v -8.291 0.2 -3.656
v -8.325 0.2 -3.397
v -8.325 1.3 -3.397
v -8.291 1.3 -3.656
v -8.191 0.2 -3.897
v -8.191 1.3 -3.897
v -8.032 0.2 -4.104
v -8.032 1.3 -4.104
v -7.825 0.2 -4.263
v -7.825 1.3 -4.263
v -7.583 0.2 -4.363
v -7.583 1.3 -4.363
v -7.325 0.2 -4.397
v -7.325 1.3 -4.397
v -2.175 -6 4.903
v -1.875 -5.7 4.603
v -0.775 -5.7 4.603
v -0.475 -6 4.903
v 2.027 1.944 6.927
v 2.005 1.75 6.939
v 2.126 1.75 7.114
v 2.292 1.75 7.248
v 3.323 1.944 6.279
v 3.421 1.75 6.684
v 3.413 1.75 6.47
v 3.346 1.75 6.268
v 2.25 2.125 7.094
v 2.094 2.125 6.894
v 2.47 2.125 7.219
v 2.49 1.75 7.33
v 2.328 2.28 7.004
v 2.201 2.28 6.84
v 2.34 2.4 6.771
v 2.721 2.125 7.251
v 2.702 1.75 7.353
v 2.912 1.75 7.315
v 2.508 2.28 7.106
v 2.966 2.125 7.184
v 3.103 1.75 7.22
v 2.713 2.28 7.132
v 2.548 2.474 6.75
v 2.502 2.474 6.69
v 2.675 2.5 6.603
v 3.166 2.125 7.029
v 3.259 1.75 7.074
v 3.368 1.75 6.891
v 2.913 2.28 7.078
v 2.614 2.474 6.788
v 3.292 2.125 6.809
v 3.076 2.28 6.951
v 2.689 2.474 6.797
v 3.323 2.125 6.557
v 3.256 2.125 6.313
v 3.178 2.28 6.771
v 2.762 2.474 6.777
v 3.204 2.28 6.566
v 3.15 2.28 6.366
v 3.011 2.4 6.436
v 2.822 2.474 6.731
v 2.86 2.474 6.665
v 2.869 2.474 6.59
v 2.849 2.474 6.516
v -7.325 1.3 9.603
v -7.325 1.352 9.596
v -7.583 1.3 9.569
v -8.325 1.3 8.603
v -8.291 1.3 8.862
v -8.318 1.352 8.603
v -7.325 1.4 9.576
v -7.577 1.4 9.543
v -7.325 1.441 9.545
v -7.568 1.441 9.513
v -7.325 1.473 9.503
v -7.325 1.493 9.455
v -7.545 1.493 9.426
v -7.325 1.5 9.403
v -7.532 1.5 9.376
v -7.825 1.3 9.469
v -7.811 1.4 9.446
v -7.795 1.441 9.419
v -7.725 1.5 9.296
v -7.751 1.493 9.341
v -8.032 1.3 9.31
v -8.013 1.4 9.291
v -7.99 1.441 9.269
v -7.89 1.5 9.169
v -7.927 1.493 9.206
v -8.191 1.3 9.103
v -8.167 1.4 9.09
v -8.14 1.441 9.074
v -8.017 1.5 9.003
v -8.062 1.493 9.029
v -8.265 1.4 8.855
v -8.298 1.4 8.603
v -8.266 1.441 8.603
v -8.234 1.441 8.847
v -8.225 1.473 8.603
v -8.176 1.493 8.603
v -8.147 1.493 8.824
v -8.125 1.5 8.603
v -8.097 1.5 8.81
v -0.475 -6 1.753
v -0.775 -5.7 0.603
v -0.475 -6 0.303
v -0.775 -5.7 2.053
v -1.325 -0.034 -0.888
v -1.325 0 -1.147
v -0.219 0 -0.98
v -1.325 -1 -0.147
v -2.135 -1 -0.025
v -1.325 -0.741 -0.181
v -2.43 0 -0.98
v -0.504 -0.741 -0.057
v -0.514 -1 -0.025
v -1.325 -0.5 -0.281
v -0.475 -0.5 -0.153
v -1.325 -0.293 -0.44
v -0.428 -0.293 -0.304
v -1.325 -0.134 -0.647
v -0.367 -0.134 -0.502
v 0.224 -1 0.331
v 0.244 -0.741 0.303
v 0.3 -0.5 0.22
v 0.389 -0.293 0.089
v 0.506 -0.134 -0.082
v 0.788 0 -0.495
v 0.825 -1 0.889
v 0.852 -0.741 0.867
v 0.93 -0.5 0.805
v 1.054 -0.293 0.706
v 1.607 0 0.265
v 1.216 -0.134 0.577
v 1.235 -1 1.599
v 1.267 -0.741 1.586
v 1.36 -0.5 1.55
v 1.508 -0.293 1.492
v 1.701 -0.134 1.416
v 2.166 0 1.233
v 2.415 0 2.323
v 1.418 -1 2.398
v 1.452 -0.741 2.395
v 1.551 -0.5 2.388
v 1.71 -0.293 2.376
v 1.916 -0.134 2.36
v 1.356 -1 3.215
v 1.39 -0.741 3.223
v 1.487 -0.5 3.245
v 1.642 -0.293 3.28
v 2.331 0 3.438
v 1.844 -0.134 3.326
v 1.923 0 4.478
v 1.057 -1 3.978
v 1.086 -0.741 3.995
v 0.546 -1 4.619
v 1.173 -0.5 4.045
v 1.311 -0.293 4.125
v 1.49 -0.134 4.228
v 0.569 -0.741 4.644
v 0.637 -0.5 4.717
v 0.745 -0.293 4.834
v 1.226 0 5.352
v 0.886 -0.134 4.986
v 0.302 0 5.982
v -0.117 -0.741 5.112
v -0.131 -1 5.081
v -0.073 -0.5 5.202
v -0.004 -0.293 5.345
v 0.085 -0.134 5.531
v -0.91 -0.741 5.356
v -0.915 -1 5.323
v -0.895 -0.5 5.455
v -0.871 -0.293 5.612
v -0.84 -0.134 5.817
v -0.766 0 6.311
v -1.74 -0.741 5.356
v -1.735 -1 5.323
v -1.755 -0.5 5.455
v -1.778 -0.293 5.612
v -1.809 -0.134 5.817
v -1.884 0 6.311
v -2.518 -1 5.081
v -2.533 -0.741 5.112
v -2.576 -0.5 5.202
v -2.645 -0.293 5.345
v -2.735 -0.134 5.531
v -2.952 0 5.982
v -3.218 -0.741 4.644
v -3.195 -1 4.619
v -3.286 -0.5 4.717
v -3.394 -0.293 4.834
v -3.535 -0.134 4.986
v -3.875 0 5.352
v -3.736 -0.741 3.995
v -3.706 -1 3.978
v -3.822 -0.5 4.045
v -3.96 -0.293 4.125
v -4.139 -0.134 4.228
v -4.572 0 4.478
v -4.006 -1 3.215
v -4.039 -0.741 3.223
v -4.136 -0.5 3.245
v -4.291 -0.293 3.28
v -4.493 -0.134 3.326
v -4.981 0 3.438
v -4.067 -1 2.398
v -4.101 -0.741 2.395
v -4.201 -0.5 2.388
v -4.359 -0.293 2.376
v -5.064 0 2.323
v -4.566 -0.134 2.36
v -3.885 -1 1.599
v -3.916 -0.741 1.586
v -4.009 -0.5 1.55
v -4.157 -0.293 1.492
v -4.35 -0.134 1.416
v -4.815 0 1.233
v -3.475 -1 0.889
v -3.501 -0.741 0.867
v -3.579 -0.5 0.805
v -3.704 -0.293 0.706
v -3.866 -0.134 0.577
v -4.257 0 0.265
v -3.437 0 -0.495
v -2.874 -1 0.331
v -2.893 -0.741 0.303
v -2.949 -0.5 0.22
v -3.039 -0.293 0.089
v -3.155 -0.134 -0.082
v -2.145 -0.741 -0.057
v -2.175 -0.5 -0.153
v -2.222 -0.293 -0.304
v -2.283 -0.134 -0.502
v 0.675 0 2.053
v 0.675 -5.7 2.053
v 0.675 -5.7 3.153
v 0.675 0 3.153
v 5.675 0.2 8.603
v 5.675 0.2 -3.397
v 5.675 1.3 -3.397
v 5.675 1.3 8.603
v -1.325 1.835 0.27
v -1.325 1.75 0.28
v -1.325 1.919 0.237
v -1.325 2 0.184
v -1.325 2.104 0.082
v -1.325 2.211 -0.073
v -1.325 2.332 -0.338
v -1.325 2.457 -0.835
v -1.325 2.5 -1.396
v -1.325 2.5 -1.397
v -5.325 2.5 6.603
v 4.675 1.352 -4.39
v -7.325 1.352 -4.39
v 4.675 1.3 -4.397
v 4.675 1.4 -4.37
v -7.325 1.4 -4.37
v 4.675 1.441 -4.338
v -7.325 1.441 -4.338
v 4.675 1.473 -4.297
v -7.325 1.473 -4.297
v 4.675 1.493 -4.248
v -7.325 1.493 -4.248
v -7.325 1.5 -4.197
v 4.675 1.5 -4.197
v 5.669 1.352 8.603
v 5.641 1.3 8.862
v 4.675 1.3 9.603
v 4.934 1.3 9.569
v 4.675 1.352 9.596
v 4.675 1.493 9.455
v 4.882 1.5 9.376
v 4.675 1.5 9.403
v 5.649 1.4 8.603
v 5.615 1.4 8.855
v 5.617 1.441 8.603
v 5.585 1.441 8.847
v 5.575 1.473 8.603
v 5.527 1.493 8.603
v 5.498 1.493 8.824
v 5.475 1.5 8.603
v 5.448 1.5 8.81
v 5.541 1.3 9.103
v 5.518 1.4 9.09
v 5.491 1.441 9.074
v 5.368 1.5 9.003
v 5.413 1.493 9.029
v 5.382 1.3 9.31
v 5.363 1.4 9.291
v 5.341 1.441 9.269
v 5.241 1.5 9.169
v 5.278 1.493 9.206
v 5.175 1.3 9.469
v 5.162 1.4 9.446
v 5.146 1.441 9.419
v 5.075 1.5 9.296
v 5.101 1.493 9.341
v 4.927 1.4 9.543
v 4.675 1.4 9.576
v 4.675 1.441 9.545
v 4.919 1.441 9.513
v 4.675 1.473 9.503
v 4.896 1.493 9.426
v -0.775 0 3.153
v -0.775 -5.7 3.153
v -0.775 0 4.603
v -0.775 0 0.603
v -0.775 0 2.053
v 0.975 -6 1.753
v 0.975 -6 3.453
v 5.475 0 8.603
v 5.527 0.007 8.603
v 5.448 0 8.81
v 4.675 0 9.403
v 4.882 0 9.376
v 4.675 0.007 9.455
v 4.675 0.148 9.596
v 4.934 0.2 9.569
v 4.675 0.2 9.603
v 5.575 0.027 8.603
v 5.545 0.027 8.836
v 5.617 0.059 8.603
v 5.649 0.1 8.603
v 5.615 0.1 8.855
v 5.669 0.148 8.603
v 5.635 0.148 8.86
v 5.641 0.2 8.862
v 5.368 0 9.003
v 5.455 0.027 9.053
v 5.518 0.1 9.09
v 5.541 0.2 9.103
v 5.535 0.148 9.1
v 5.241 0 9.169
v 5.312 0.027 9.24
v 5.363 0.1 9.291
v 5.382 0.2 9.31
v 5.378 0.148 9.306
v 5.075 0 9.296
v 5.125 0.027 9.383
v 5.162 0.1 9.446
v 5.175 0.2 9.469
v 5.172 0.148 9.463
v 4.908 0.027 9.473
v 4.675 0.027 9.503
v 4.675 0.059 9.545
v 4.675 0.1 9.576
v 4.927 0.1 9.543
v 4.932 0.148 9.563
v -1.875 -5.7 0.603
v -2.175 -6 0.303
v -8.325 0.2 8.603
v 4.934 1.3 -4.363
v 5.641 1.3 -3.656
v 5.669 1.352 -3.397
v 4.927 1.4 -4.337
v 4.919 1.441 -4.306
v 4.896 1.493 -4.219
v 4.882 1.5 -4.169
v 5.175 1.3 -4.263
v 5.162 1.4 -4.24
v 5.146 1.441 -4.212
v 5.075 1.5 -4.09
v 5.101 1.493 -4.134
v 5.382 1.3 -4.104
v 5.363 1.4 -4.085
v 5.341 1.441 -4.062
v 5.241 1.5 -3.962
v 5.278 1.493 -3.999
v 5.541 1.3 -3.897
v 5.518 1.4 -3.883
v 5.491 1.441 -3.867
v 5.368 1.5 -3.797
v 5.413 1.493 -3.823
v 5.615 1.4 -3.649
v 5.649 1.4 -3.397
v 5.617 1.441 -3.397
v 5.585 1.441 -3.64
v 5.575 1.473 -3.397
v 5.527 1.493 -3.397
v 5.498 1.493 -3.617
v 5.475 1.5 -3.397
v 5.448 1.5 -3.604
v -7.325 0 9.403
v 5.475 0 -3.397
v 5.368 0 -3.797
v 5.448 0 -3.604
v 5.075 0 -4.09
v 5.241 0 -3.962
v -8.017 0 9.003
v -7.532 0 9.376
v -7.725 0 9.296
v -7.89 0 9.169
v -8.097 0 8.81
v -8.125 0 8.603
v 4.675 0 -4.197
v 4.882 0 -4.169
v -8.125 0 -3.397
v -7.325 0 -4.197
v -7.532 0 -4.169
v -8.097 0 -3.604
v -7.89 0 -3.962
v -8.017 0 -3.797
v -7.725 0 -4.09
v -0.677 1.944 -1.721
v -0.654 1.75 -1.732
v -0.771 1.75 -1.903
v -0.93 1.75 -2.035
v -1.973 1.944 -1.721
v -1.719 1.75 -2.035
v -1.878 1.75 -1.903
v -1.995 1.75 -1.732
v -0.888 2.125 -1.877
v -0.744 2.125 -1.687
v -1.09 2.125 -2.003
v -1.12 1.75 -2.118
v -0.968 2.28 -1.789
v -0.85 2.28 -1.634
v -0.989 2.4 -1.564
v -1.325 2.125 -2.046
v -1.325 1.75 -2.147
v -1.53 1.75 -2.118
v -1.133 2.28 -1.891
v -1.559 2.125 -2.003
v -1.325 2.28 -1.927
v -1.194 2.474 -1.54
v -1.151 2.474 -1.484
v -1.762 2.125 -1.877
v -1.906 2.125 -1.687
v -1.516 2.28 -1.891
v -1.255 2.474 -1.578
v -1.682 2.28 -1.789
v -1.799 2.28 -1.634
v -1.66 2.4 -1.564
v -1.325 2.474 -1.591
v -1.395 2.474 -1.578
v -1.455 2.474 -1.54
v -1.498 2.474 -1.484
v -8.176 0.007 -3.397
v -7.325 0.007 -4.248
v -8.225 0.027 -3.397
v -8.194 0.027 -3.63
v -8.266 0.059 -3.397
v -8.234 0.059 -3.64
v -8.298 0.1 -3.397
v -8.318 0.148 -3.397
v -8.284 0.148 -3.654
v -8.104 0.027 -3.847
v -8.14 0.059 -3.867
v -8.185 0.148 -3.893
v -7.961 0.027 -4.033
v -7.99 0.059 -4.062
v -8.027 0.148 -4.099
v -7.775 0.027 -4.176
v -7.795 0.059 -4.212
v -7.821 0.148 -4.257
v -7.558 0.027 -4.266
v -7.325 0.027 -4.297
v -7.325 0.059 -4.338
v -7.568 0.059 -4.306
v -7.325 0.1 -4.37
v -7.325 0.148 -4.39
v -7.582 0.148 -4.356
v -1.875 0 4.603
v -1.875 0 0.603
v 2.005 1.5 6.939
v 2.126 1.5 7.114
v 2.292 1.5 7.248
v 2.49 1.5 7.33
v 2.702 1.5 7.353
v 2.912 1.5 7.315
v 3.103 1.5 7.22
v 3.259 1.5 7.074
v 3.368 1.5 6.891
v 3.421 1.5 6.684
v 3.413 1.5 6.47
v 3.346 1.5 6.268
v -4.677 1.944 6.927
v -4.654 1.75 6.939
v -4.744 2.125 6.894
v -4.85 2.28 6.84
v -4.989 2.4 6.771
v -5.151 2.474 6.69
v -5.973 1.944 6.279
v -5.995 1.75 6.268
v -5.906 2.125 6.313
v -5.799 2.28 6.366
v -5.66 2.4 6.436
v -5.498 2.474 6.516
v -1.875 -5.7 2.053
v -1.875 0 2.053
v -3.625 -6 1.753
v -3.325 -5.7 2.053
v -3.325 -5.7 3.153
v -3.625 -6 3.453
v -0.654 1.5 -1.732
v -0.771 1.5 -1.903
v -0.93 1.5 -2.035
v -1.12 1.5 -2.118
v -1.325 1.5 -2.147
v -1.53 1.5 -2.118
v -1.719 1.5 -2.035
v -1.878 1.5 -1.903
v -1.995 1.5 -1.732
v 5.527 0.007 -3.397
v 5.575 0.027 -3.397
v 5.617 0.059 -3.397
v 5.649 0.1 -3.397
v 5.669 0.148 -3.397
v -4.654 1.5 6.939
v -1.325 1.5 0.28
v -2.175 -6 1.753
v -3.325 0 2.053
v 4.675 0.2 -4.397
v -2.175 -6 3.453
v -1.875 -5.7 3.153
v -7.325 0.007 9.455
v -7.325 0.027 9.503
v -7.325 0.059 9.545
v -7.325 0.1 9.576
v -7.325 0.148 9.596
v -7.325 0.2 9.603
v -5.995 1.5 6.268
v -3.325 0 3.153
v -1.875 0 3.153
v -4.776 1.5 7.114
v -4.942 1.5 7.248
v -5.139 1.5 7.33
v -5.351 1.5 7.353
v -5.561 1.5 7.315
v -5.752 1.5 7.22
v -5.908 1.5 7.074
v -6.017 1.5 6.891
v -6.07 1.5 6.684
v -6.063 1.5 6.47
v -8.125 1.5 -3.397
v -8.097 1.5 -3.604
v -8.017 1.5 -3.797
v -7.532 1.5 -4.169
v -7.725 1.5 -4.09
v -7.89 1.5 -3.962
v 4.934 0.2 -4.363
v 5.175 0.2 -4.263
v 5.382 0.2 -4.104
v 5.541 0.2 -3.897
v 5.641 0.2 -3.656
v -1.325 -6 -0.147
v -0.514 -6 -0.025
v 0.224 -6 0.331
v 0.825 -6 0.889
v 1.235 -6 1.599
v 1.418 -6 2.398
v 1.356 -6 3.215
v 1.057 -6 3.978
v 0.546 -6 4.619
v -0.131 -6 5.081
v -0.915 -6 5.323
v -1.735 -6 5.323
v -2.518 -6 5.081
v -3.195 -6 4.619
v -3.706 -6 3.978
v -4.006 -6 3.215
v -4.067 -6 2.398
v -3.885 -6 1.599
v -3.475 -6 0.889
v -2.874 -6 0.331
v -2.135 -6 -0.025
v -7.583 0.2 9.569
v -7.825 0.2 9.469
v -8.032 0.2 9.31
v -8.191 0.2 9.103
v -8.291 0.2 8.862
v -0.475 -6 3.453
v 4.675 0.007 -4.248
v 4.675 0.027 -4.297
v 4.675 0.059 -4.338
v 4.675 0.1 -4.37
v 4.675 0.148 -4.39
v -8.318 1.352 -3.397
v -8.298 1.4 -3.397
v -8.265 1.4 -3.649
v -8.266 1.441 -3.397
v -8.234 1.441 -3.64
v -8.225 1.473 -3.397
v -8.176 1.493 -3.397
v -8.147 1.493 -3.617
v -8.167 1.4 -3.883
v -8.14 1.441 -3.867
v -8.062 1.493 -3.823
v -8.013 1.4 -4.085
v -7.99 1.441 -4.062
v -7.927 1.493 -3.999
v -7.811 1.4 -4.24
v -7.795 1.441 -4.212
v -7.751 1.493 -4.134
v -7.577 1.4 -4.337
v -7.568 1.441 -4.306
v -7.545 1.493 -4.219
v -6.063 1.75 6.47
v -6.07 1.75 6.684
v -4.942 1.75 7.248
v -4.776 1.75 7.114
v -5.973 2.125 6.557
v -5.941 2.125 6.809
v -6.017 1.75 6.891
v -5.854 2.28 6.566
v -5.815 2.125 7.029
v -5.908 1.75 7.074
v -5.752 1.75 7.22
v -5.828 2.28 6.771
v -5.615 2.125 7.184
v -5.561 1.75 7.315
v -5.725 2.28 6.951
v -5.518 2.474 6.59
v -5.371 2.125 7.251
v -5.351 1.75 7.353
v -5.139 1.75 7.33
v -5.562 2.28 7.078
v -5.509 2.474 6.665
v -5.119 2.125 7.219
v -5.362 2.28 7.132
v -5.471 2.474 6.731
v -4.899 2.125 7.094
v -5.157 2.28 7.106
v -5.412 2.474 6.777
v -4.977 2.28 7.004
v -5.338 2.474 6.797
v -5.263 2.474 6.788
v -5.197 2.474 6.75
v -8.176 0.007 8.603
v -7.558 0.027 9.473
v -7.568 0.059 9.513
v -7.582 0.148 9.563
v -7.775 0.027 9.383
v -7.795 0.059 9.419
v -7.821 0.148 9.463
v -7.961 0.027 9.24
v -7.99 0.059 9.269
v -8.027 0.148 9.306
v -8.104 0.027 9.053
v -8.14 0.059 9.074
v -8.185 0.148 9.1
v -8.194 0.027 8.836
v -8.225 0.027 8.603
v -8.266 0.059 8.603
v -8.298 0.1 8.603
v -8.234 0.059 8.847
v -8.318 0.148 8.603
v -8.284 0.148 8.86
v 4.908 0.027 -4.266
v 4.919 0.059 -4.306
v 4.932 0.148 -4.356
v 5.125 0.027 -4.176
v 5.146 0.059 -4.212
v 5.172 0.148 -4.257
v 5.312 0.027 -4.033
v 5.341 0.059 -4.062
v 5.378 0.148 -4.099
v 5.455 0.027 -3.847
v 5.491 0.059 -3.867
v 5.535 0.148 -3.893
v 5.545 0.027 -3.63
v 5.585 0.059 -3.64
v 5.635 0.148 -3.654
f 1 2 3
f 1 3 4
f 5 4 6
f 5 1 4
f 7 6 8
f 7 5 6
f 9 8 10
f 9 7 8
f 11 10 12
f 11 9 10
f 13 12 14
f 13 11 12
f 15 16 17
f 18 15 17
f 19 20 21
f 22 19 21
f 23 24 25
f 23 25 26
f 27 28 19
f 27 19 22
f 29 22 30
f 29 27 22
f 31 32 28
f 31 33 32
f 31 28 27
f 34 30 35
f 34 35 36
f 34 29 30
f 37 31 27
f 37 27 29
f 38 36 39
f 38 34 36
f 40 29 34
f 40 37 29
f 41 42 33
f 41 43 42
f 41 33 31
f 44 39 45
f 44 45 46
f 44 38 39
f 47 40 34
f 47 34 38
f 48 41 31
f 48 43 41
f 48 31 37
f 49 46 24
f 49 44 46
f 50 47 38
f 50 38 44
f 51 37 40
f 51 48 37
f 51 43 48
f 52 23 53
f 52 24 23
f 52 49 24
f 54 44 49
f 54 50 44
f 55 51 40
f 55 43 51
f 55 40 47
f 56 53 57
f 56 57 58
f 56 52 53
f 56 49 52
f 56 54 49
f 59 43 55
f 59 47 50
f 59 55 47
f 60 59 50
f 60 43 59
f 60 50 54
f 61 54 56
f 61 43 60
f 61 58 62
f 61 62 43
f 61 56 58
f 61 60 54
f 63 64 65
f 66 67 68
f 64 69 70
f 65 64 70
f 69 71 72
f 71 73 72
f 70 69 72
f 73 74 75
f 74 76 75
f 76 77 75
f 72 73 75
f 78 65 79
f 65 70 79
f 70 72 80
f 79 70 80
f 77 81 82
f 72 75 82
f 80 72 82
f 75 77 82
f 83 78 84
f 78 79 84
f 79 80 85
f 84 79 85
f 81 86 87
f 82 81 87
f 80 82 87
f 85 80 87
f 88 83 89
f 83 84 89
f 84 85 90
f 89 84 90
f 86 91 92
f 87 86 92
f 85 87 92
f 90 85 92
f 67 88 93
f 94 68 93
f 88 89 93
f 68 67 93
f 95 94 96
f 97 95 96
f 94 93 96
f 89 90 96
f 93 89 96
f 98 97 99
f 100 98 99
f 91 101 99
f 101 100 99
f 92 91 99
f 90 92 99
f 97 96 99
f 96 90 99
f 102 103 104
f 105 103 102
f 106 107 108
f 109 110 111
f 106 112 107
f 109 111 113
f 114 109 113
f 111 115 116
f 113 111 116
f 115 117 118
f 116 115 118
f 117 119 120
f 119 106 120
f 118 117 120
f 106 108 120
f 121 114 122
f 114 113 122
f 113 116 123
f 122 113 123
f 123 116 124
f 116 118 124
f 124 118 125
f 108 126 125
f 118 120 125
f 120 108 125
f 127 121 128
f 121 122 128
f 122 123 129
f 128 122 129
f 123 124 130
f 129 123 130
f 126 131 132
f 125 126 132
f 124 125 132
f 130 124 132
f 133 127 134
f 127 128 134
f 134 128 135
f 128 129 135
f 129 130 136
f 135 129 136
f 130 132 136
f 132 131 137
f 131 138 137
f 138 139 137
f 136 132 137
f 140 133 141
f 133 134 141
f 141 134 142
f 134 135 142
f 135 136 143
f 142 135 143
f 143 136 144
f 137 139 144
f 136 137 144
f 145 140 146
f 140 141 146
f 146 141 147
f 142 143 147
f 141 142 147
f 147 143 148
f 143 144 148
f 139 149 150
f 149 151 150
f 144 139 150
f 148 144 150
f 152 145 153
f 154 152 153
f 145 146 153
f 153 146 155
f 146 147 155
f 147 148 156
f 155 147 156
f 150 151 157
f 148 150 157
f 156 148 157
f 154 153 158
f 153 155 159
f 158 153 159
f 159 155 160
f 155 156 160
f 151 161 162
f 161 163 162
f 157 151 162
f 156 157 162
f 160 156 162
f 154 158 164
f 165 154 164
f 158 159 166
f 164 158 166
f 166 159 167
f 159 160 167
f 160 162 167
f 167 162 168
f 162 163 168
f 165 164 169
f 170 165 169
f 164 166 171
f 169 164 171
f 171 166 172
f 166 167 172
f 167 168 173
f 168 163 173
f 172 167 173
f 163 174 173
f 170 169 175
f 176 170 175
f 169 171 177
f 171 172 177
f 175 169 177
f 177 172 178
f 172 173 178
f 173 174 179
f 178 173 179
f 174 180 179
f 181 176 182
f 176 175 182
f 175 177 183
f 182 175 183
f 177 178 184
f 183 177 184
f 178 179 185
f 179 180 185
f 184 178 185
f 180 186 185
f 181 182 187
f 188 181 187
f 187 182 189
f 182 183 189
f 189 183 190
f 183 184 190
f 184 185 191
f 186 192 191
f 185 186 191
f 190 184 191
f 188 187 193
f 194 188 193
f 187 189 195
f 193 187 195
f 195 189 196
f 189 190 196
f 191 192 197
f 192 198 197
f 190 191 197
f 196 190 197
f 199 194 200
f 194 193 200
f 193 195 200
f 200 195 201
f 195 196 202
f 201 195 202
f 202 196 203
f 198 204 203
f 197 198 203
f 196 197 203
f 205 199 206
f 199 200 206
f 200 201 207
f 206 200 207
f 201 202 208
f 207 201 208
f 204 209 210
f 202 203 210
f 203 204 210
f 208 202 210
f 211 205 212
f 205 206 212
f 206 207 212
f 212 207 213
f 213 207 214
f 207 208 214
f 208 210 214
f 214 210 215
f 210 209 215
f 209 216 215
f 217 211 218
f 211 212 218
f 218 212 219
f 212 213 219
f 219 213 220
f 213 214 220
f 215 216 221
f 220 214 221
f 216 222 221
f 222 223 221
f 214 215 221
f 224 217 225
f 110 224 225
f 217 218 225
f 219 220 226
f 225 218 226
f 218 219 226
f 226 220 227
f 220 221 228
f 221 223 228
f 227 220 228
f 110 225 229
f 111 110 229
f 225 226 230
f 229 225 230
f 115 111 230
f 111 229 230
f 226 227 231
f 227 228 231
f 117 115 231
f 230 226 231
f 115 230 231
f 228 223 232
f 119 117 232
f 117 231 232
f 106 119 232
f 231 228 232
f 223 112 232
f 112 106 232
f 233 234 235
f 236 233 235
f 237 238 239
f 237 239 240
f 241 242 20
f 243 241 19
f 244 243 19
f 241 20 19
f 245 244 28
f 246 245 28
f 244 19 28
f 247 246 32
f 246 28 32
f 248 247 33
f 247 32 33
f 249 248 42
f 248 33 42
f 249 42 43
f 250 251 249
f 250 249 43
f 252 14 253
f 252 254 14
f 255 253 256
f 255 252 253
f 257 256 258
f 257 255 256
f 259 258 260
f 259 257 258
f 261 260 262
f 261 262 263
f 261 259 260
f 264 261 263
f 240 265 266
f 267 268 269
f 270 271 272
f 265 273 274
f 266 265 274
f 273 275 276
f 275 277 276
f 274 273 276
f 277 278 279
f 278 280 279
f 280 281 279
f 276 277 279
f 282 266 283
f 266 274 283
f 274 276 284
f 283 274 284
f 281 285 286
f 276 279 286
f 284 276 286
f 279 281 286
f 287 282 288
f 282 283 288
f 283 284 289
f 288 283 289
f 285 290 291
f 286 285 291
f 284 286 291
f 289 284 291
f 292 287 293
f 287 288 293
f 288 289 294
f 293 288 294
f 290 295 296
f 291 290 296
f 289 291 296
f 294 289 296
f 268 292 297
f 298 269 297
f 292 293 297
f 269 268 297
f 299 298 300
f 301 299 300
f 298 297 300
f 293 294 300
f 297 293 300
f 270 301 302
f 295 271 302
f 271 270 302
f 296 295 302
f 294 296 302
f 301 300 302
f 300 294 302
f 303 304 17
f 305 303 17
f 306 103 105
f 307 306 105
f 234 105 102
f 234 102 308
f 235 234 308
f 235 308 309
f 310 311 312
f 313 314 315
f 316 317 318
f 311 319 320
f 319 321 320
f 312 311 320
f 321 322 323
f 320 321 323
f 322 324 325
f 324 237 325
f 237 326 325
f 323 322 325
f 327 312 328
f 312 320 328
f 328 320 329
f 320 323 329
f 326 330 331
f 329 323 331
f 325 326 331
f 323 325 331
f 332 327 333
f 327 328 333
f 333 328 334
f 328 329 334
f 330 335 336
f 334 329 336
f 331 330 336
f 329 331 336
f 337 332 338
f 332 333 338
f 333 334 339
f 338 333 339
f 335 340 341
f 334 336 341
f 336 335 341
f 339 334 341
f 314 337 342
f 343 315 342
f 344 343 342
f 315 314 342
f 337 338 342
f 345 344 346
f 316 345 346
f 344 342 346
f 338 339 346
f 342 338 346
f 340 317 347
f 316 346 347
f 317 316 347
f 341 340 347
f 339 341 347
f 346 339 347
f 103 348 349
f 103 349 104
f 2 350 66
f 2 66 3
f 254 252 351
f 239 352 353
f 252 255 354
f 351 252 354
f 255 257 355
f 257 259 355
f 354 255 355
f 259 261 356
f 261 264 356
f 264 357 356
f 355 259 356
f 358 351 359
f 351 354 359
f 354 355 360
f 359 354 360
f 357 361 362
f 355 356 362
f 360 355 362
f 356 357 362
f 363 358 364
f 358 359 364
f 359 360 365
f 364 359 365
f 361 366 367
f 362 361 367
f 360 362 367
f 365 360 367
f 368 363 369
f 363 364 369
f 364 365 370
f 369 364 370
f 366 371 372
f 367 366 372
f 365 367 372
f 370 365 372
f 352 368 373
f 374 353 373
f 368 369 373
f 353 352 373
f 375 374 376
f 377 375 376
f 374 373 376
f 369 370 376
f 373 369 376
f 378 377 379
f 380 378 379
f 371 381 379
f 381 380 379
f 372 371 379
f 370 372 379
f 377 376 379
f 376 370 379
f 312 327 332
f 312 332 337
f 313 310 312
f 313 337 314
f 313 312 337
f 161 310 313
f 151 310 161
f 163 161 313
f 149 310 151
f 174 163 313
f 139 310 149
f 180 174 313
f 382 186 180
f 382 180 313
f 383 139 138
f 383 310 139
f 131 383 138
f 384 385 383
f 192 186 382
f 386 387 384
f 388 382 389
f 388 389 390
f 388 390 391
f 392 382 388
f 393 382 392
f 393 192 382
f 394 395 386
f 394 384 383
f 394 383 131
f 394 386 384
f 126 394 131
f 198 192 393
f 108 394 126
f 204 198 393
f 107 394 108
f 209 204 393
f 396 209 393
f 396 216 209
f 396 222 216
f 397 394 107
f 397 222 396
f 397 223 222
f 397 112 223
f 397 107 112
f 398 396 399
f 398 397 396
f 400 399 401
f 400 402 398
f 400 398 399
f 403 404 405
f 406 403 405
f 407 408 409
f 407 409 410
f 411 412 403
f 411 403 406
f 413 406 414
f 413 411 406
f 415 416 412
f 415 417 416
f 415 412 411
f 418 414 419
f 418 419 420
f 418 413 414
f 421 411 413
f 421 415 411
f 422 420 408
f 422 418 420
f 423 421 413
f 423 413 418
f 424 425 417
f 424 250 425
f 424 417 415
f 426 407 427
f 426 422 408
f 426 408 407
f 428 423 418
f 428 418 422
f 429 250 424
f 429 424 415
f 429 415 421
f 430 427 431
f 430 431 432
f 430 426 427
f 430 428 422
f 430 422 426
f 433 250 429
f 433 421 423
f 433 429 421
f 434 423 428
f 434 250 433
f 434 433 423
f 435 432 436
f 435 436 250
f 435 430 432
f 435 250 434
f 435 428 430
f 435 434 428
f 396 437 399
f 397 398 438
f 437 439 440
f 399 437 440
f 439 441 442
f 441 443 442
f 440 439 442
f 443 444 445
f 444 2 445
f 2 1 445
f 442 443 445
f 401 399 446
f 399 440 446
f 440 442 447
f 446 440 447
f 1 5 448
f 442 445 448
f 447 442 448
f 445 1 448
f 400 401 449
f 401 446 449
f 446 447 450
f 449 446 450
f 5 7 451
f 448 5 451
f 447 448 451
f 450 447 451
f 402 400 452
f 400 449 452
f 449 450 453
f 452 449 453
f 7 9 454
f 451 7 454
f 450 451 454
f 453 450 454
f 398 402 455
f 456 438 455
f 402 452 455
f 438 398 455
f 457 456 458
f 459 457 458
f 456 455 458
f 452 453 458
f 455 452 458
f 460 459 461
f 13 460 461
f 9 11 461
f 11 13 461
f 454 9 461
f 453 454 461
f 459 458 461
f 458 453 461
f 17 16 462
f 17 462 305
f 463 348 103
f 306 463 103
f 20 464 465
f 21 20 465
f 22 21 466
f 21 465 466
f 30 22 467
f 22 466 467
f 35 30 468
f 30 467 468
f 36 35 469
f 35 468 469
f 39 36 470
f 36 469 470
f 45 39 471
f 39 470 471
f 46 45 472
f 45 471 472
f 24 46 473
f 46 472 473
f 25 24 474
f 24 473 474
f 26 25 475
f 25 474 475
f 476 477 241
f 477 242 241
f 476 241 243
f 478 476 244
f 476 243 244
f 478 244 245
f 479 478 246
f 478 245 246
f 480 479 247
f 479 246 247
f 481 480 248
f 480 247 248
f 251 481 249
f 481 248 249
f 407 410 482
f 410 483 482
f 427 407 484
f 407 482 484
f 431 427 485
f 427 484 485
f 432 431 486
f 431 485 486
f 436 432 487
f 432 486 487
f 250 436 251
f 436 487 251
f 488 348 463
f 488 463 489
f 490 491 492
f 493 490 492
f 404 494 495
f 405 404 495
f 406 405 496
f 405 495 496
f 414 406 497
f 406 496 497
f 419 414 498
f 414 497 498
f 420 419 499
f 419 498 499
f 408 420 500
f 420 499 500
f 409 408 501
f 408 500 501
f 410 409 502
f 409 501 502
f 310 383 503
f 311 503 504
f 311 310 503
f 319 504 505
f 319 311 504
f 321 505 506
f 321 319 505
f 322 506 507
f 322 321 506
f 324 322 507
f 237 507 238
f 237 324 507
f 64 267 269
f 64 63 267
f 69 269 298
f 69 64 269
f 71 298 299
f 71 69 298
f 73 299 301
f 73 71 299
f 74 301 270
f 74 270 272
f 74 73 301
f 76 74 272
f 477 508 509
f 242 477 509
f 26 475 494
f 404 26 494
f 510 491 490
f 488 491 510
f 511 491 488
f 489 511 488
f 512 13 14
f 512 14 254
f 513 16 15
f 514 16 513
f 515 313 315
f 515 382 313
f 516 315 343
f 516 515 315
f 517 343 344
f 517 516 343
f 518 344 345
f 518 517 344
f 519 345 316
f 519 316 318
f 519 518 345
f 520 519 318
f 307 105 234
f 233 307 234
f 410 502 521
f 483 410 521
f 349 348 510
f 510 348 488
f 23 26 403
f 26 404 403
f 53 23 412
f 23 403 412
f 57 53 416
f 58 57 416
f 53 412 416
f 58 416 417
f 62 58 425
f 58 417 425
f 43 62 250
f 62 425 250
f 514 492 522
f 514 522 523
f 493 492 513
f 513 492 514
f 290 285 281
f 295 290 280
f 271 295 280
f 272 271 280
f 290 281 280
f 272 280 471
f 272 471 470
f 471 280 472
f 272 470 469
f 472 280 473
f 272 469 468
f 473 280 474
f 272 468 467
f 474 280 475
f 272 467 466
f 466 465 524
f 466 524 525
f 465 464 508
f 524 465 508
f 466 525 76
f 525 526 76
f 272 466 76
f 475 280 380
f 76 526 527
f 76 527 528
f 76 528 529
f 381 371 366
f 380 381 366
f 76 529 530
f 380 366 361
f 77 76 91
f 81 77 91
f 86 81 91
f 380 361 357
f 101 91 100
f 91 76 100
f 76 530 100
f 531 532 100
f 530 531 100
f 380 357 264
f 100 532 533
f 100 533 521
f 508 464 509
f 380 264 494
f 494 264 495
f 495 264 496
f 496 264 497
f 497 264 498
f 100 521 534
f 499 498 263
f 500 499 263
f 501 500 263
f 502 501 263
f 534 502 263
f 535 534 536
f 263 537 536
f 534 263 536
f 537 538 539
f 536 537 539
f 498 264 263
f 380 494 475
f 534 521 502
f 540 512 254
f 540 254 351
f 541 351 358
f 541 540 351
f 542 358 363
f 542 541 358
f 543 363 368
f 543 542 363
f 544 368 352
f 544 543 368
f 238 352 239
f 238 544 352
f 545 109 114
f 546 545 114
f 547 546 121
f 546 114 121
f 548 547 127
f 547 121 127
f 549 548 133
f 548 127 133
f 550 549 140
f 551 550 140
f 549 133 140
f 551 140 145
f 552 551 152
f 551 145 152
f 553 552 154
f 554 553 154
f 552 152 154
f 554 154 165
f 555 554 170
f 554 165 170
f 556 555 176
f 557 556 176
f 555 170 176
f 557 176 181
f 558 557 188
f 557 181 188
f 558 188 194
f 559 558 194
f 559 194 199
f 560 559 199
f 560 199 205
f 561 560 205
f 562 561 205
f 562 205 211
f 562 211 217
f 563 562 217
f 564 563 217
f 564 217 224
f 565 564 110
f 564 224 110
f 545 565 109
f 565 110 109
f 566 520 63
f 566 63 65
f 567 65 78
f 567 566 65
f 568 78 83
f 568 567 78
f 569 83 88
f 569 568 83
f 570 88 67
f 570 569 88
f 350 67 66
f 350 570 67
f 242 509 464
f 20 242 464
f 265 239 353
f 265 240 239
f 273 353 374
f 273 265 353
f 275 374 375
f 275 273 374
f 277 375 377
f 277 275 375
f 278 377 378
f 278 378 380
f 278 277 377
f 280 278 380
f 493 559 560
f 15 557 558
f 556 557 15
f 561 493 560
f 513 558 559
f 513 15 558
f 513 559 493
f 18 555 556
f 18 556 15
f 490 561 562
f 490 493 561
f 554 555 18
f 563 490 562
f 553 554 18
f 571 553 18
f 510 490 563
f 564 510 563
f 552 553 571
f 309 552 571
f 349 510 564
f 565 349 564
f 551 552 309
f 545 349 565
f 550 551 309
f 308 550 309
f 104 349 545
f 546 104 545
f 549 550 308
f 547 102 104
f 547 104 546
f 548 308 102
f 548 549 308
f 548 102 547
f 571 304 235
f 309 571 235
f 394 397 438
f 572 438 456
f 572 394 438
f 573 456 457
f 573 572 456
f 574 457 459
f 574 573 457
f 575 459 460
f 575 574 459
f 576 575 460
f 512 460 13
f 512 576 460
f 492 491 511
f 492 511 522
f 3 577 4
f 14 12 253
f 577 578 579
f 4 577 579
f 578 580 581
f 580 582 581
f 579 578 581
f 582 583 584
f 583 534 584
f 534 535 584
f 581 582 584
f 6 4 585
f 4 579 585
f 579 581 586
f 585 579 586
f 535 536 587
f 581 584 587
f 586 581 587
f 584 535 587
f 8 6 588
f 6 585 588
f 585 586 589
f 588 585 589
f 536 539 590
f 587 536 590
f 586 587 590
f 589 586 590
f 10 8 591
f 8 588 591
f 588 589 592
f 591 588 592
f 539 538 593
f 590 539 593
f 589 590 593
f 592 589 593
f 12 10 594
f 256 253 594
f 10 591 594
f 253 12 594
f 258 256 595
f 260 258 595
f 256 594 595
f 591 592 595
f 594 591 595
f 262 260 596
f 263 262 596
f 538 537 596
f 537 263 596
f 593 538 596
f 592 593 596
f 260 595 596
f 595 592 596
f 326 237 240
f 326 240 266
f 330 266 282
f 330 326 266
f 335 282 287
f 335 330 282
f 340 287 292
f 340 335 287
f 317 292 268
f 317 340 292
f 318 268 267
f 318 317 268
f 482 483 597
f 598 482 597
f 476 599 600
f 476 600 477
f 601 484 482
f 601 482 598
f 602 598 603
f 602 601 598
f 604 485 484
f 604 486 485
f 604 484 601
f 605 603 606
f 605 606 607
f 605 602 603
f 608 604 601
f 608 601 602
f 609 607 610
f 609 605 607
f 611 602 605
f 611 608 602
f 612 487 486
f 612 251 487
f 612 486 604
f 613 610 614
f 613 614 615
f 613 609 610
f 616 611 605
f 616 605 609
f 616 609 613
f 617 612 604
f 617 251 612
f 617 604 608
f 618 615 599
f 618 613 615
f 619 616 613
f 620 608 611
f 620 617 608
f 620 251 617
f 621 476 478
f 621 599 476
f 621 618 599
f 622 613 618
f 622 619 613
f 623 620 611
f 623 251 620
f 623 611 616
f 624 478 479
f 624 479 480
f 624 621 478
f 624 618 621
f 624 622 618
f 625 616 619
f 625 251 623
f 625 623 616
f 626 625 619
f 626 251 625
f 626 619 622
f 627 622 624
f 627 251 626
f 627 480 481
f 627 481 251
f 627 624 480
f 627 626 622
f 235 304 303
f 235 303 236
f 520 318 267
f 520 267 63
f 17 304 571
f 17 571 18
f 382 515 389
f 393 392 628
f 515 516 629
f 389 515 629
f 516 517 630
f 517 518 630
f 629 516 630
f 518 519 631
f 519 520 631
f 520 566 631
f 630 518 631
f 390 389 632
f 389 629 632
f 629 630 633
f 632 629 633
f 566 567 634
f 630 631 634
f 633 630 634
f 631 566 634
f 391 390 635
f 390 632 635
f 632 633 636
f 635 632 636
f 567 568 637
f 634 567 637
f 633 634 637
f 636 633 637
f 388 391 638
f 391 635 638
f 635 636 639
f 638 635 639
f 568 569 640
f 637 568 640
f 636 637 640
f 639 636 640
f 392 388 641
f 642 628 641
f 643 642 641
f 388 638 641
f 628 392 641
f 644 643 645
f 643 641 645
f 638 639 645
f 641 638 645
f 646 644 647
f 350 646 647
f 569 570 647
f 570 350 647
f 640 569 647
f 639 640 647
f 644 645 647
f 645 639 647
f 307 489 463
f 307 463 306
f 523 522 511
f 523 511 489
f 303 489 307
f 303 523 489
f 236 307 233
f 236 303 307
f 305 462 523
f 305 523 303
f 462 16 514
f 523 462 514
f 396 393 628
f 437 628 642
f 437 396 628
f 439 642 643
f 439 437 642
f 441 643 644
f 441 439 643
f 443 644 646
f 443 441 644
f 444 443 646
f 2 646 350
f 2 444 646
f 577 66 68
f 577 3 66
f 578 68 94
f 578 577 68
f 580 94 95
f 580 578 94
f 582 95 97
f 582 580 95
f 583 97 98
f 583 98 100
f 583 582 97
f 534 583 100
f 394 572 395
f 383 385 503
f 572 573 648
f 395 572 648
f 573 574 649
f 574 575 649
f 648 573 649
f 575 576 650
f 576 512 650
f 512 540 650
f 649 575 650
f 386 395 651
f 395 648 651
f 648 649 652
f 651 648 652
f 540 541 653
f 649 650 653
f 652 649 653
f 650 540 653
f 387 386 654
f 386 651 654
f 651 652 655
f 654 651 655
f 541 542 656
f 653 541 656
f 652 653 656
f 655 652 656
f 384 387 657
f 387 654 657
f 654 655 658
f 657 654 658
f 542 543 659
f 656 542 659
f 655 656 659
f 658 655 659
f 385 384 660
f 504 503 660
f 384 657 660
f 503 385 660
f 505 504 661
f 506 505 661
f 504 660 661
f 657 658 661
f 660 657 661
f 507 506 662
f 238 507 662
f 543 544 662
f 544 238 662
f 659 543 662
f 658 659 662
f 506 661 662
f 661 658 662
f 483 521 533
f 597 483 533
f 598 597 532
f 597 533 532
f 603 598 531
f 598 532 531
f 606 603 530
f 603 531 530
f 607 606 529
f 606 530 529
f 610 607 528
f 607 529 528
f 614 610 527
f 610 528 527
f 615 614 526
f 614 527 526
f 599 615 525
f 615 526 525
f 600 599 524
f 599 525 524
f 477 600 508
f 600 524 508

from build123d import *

# Parameters (mm, degrees)
BOSS_EXTRUDE1_DEPTH = 1.5
SKETCH2_R           = 2.75
BOSS_EXTRUDE2_DEPTH = 6
SKETCH3_W           = 1.1
SKETCH3_H           = 1.45
SKETCH3_W_2         = 1.45
SKETCH3_H_2         = 1.1
CUT_EXTRUDE1_DEPTH  = 6
CHAMFER1_SIZE       = 0.3
FILLET1_R           = 1
FILLET3_R           = 0.2
BOSS_EXTRUDE3_DEPTH = 1
FILLET6_R           = 0.75


with BuildPart() as part:
    # Sketch1 → Boss-Extrude1 (new body)
    with BuildSketch(Plane(origin=(0, 0, 0), x_dir=(1, 0, 0), z_dir=(0, 1, 0))):
        with BuildLine():
            Line((-7.324675649, 4.396717546), (4.675324351, 4.396717546))
            ThreePointArc((4.675324351, 4.396717546), (5.382431132, 4.103824327), (5.675324351, 3.396717546))
            Line((5.675324351, 3.396717546), (5.675324351, -8.603282454))
            ThreePointArc((5.675324351, -8.603282454), (5.382431132, -9.310389235), (4.675324351, -9.603282454))
            Line((4.675324351, -9.603282454), (-7.324675649, -9.603282454))
            ThreePointArc((-7.324675649, -9.603282454), (-8.03178243, -9.310389235), (-8.324675649, -8.603282454))
            Line((-8.324675649, -8.603282454), (-8.324675649, 3.396717546))
            ThreePointArc((-8.324675649, 3.396717546), (-8.03178243, 4.103824327), (-7.324675649, 4.396717546))
        make_face()
    extrude(amount=BOSS_EXTRUDE1_DEPTH)

    # Sketch2 → Boss-Extrude2 (add)
    with BuildSketch(Plane.XZ):
        with Locations(Location((-1.324675649, 2.603282454, 0), (0, 0, 270))):
            Circle(SKETCH2_R)
    extrude(amount=BOSS_EXTRUDE2_DEPTH)

    # Sketch3 → Cut-Extrude1 (cut)
    with BuildSketch(Plane.XZ.offset(6)):
        with Locations((-1.324675649, 3.878282454)):
            Rectangle(SKETCH3_W, SKETCH3_H)
        with Locations((-0.049675649, 2.603282454)):
            Rectangle(SKETCH3_W_2, SKETCH3_H_2)
        with Locations((-1.324675649, 2.603282454)):
            Rectangle(SKETCH3_W, SKETCH3_H_2)
        with Locations((-2.599675649, 2.603282454)):
            Rectangle(SKETCH3_W_2, SKETCH3_H_2)
        with Locations((-1.324675649, 1.328282454)):
            Rectangle(SKETCH3_W, SKETCH3_H)
    extrude(amount=-CUT_EXTRUDE1_DEPTH, mode=Mode.SUBTRACT)

    # Chamfer1
    chamfer1_edges = [part.edges().sort_by_distance(p)[0] for p in [
        (-0.774675649, -6, 3.878282454),
        (-0.049675649, -6, 3.153282454),
        (0.675324351, -6, 2.603282454),
        (-0.774675649, -6, 1.328282454),
        (-2.599675649, -6, 3.153282454),
        (-1.324675649, -6, 4.603282454),
        (-1.874675649, -6, 3.878282454),
        (-3.324675649, -6, 2.603282454),
        (-2.599675649, -6, 2.053282454),
        (-1.874675649, -6, 1.328282454),
        (-1.324675649, -6, 0.603282454),
        (-0.049675649, -6, 2.053282454),
    ]]
    chamfer(chamfer1_edges, length=CHAMFER1_SIZE)

    # Fillet1
    fillet1_edges = [part.edges().sort_by_distance(p)[0] for p in [
        (-1.324675649, 0, 5.353282454),
    ]]
    fillet(fillet1_edges, radius=FILLET1_R)

    # Fillet3
    fillet3_edges = [part.edges().sort_by_distance(p)[0] for p in [
        (5.382431132, 1.5, 9.310389235),
        (-1.324675649, 0, 9.603282454),
        (-8.03178243, 0, 9.310389235),
        (5.675324351, 1.5, 2.603282454),
        (5.382431132, 1.5, -4.103824327),
        (-1.324675649, 1.5, -4.396717546),
        (-8.03178243, 1.5, -4.103824327),
        (-8.324675649, 1.5, 2.603282454),
        (-8.03178243, 1.5, 9.310389235),
        (-1.324675649, 1.5, 9.603282454),
        (-8.324675649, 0, 2.603282454),
        (-8.03178243, 0, -4.103824327),
        (-1.324675649, 0, -4.396717546),
        (5.382431132, 0, -4.103824327),
        (5.675324351, 0, 2.603282454),
        (5.382431132, 0, 9.310389235),
    ]]
    fillet(fillet3_edges, radius=FILLET3_R)

    # Sketch4 → Boss-Extrude3 (add)
    with BuildSketch(Plane(origin=(0, 1.5, 0), x_dir=(1, 0, 0), z_dir=(0, 1, 0))):
        with BuildLine():
            ThreePointArc((-0.653855256, 1.732127742), (-0.574675649, 1.396717546), (-0.653855256, 1.061307349))
            Line((-0.653855256, 1.061307349), (-1.324675649, -0.280333437))
            Line((-1.324675649, -0.280333437), (2.004503957, -6.938692651))
            ThreePointArc((2.004503957, -6.938692651), (3.010734547, -7.274102848), (3.346144744, -6.267872258))
            Line((3.346144744, -6.267872258), (-0.653855256, 1.732127742))
        make_face()
        with BuildLine():
            Line((-1.324675649, -0.280333437), (-0.653855256, 1.061307349))
            ThreePointArc((-0.653855256, 1.061307349), (-0.574675649, 1.396717546), (-0.653855256, 1.732127742))
            ThreePointArc((-0.653855256, 1.732127742), (-1.324675649, 2.146717546), (-1.995496043, 1.732127742))
            ThreePointArc((-1.995496043, 1.732127742), (-2.074675649, 1.396717546), (-1.995496043, 1.061307349))
            Line((-1.995496043, 1.061307349), (-1.324675649, -0.280333437))
        make_face()
        with BuildLine():
            Line((-4.653855256, -6.938692651), (-1.324675649, -0.280333437))
            Line((-1.324675649, -0.280333437), (-1.995496043, 1.061307349))
            ThreePointArc((-1.995496043, 1.061307349), (-2.074675649, 1.396717546), (-1.995496043, 1.732127742))
            Line((-1.995496043, 1.732127742), (-5.995496043, -6.267872258))
            ThreePointArc((-5.995496043, -6.267872258), (-5.660085846, -7.274102848), (-4.653855256, -6.938692651))
        make_face()
    extrude(amount=BOSS_EXTRUDE3_DEPTH)

    # Fillet6
    fillet6_edges = [part.edges().sort_by_distance(p)[0] for p in [
        (1.346144744, 2.5, 2.267872258),
        (-2.989265453, 2.5, 3.609513044),
        (-1.324675649, 2.5, -2.146717546),
        (-3.995496043, 2.5, 2.267872258),
        (-5.660085846, 2.5, 7.274102848),
        (0.339914154, 2.5, 3.609513044),
        (3.010734547, 2.5, 7.274102848),
    ]]
    fillet(fillet6_edges, radius=FILLET6_R - 0.0001)  # a hair under: the kernel refuses the full size


solid = part.part
